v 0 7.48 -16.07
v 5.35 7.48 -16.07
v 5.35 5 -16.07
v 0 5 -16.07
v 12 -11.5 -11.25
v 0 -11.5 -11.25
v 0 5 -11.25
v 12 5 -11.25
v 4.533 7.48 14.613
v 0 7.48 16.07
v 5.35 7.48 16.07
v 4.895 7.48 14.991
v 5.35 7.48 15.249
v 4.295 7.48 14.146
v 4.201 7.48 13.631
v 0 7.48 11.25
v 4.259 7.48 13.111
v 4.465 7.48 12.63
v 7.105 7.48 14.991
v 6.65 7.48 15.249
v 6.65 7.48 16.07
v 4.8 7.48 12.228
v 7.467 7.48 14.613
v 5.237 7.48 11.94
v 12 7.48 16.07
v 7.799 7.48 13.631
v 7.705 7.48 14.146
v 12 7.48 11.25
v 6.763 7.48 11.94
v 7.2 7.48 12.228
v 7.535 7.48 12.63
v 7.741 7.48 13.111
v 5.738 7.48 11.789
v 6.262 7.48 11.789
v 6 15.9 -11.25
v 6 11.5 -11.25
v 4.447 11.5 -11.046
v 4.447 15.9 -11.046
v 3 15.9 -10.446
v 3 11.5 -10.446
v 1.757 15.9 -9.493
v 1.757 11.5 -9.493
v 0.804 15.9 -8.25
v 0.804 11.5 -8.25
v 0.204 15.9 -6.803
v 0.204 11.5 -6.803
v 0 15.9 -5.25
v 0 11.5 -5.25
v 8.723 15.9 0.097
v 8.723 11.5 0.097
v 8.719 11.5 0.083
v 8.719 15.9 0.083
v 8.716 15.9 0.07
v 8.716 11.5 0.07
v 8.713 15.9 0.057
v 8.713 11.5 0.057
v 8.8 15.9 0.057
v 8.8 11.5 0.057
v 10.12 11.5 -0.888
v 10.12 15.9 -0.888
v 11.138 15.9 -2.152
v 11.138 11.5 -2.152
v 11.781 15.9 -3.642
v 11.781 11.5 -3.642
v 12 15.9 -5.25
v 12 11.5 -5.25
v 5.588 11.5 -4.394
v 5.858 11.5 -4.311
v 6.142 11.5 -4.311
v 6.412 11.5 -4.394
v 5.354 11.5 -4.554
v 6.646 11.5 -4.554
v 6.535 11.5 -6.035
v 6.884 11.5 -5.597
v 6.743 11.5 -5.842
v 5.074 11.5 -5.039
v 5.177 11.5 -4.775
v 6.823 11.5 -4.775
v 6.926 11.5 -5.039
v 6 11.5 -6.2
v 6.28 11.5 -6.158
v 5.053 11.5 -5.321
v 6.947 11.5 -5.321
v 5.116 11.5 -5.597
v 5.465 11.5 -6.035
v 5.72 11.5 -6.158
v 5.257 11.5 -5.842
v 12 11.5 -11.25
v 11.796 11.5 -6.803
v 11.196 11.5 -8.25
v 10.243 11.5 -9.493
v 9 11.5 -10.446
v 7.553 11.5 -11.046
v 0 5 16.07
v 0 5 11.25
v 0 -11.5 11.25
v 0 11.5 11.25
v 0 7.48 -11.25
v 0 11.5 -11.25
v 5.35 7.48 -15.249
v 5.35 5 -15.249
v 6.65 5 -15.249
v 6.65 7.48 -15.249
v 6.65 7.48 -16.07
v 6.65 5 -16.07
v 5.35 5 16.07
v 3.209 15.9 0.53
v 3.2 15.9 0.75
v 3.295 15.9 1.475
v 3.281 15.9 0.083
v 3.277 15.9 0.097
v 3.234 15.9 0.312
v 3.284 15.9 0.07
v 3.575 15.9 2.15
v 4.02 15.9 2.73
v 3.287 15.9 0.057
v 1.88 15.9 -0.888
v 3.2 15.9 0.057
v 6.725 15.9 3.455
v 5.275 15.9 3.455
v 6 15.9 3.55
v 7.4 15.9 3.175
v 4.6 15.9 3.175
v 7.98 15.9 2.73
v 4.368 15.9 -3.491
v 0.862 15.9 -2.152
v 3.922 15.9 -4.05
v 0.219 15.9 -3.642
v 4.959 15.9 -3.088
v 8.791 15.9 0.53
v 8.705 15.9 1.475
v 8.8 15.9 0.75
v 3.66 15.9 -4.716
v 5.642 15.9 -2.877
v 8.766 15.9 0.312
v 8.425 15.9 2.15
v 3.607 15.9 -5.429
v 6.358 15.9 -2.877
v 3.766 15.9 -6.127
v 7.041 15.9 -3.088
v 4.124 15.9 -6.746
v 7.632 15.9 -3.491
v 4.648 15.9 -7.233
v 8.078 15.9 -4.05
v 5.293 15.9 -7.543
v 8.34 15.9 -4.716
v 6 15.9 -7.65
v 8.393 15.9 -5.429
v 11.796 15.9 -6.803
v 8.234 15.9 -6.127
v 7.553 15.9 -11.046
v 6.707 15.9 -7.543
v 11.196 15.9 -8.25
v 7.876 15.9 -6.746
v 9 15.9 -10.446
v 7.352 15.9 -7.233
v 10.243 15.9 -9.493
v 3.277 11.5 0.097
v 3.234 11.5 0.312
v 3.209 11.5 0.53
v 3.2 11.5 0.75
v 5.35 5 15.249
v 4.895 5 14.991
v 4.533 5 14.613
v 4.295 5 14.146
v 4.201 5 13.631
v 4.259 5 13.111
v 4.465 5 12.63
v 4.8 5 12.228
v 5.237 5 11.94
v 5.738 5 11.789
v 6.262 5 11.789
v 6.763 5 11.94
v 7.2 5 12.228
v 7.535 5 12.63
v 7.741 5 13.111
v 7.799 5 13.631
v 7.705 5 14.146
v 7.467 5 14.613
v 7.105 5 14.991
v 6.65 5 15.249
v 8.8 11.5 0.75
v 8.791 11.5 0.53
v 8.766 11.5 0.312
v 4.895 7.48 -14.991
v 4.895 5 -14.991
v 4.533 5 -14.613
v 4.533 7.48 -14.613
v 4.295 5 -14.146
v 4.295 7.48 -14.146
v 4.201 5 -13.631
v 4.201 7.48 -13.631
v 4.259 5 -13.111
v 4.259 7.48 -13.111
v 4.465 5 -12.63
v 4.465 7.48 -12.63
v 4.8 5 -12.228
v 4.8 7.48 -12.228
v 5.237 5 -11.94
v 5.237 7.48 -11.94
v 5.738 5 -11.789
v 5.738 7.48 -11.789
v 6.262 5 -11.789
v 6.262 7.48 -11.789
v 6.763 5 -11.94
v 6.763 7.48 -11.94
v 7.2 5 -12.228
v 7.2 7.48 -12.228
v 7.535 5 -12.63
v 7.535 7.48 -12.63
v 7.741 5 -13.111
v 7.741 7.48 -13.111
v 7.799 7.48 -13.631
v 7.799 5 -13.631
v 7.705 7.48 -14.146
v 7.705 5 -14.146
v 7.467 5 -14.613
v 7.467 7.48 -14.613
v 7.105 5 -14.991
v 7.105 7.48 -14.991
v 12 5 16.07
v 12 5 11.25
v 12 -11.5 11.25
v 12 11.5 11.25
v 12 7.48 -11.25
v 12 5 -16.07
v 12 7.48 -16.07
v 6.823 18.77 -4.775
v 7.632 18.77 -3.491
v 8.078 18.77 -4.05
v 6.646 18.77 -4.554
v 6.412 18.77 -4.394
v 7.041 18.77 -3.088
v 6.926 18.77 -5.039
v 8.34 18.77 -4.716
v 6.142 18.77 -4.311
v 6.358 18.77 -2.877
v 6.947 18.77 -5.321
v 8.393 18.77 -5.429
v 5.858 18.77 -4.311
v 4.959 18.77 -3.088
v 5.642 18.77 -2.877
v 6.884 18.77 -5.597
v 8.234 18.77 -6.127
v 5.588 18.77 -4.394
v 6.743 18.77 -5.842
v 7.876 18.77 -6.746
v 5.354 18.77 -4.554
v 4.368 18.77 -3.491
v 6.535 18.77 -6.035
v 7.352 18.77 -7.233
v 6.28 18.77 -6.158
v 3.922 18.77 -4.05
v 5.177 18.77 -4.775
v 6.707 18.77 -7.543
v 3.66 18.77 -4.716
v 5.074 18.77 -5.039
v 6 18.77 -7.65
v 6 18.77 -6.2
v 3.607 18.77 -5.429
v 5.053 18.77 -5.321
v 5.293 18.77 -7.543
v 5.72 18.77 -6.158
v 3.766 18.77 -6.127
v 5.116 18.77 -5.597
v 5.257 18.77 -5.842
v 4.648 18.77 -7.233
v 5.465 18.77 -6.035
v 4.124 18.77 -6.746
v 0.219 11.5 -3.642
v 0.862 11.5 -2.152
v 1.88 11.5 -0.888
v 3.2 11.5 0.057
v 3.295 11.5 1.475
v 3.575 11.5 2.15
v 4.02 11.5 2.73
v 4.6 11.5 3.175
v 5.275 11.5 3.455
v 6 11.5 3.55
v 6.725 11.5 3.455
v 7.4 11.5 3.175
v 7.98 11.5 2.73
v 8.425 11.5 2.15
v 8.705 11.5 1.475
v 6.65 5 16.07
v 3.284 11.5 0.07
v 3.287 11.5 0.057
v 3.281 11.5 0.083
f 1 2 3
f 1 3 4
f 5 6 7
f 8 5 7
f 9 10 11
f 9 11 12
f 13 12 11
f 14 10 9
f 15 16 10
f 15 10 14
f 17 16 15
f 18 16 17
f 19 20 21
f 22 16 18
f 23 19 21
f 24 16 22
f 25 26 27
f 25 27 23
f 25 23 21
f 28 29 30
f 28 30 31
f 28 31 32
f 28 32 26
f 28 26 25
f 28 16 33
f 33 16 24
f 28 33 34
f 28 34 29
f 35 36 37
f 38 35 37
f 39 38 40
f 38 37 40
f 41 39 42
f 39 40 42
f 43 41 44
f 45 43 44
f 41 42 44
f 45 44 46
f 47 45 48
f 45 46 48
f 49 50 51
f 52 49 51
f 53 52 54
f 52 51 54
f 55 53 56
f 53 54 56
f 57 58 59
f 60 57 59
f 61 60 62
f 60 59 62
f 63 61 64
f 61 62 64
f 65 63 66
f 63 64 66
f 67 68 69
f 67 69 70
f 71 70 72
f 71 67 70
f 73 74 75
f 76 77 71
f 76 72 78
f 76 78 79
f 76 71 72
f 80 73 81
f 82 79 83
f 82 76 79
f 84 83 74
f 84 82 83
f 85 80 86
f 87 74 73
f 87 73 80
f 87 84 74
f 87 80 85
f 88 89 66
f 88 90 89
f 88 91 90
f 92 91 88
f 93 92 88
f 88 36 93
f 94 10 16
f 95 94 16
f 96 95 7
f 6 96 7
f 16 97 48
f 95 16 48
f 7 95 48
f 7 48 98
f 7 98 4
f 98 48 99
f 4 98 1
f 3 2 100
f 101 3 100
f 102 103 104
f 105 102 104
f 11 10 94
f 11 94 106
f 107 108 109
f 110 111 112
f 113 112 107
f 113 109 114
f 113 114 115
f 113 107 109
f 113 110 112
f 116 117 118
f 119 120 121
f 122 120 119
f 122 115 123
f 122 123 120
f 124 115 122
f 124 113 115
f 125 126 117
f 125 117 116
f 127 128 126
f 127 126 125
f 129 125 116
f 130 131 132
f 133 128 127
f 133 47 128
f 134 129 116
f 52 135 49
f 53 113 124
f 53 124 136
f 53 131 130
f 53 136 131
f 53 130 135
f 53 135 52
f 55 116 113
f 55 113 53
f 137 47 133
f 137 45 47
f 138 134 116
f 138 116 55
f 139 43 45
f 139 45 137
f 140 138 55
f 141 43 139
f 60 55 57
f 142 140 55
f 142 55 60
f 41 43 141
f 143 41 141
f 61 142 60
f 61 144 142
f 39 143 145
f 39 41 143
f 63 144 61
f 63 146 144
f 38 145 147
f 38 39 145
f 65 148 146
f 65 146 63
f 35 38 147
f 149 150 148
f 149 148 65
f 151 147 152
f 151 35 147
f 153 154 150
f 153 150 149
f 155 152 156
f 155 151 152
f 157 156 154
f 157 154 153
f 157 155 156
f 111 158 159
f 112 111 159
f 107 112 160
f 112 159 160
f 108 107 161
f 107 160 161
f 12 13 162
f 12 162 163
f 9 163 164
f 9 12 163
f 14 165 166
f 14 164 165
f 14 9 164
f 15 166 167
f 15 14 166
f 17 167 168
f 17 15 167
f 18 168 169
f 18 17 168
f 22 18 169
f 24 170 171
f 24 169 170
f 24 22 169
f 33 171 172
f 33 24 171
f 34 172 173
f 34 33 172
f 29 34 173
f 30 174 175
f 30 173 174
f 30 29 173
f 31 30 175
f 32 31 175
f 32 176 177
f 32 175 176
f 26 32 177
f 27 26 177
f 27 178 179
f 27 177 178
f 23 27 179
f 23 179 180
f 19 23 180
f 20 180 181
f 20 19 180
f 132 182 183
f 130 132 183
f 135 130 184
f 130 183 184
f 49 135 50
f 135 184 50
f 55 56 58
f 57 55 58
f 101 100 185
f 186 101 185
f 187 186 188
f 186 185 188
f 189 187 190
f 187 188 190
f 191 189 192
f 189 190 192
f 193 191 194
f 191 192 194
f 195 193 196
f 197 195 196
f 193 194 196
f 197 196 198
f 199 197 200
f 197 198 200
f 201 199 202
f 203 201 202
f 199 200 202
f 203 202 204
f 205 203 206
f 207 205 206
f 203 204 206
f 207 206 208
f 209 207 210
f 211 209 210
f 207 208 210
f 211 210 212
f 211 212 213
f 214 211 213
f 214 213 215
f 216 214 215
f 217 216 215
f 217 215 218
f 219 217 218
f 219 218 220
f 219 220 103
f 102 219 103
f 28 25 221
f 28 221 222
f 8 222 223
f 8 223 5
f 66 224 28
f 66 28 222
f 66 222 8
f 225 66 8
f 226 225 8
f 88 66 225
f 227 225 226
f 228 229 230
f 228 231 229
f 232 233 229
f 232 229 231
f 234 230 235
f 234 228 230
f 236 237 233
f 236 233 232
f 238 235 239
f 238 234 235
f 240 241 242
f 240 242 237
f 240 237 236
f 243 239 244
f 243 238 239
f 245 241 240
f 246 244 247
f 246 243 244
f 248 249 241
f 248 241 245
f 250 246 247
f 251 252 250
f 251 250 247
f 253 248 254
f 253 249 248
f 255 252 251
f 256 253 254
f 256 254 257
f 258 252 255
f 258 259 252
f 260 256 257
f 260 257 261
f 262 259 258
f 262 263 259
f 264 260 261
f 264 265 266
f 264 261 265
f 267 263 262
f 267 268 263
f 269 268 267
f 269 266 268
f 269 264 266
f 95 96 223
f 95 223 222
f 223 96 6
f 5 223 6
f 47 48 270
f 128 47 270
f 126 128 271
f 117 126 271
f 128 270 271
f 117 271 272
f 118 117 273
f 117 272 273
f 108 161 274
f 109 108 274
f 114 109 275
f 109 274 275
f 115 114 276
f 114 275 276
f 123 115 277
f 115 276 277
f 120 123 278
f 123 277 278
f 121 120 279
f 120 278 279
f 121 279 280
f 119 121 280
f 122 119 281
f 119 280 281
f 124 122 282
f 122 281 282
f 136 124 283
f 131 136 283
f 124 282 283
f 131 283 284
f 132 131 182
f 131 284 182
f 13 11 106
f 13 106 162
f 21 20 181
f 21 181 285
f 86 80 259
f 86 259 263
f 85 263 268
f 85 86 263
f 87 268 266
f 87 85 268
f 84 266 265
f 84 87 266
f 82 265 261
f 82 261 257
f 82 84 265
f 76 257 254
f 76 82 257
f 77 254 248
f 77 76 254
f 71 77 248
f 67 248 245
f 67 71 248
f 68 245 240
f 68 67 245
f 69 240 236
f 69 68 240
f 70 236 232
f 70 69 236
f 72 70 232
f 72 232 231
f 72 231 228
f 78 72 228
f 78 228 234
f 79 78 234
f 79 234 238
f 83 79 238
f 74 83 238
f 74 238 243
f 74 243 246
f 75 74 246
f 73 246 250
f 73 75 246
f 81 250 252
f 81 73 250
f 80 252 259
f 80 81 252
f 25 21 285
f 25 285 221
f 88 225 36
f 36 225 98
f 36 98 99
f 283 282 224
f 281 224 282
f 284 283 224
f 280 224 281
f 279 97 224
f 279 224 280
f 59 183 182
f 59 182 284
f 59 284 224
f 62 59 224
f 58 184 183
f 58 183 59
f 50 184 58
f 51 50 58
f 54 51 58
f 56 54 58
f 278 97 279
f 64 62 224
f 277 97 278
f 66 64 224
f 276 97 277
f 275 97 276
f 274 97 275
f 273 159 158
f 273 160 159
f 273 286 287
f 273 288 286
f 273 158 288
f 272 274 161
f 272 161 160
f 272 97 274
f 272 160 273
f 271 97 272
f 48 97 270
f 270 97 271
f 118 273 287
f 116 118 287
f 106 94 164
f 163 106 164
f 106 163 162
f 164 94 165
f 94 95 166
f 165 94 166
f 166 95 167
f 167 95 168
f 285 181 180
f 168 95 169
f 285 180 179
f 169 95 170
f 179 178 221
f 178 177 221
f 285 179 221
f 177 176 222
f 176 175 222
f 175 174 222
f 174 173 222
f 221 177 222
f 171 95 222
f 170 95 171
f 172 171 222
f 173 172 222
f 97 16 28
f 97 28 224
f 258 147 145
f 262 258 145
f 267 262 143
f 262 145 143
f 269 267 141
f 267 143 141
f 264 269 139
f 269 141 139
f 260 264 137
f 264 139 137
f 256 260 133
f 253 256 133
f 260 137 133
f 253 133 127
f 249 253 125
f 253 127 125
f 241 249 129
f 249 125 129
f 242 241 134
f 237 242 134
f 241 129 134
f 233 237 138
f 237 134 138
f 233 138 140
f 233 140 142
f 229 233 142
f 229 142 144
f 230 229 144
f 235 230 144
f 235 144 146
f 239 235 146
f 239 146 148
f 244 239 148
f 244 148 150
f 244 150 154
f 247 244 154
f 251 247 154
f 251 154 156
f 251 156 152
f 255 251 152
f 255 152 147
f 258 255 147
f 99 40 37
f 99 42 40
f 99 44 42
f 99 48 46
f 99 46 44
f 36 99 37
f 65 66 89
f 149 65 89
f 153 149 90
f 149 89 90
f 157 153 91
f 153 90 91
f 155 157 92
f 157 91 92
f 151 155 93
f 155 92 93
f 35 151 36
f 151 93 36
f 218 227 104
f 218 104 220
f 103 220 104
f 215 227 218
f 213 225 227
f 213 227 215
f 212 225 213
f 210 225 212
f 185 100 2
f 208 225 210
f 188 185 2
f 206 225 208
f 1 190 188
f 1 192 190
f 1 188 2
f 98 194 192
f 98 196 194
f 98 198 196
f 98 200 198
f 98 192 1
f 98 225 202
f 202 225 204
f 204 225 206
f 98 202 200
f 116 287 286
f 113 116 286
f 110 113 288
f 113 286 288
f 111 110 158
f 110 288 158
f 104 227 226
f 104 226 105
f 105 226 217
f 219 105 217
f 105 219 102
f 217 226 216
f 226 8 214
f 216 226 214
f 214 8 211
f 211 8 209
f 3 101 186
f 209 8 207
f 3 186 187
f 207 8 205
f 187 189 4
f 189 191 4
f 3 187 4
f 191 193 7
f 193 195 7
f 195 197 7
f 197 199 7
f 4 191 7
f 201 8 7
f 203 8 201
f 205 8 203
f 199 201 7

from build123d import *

# Parameters (mm, degrees)
SKETCH2_W            = 22.5
SKETCH2_H            = 23
BOSS_EXTRUDE1_DEPTH  = 12
SKETCH19_W           = 12
SKETCH19_H           = 2.48
BOSS_EXTRUDE8_DEPTH  = 4.82
SKETCH20_W           = 12
SKETCH20_H           = 2.48
BOSS_EXTRUDE9_DEPTH  = 4.82
SKETCH21_R           = 2.4
BOSS_EXTRUDE10_DEPTH = 4.4
SKETCH21_3_R         = 2.4
SKETCH21_3_R_2       = 0.95
BOSS_EXTRUDE11_DEPTH = 7.27
CUT_EXTRUDE5_DEPTH   = 2.49


with BuildPart() as part:
    # Sketch2 → Boss-Extrude1 (new body)
    with BuildSketch(Plane(origin=(0, 0, 0), x_dir=(0, 0, -1), z_dir=(1, 0, 0))):
        Rectangle(SKETCH2_W, SKETCH2_H)
    extrude(amount=BOSS_EXTRUDE1_DEPTH)

    # Sketch19 → Boss-Extrude8 (add)
    with BuildSketch(Plane.XY.offset(11.25)):
        with Locations((6, 6.24)):
            Rectangle(SKETCH19_W, SKETCH19_H)
    extrude(amount=BOSS_EXTRUDE8_DEPTH)

    # Sketch20 → Boss-Extrude9 (add)
    with BuildSketch(Plane(origin=(0, 0, -11.25), x_dir=(-1, 0, 0), z_dir=(0, 0, -1))):
        with Locations((-6, 6.24)):
            Rectangle(SKETCH20_W, SKETCH20_H)
    extrude(amount=BOSS_EXTRUDE9_DEPTH)

    # Sketch21 → Boss-Extrude10 (add)
    # profile 1 of 6: a face of its own
    with BuildSketch(Plane(origin=(0, 11.5, 0), x_dir=(1, 0, 0), z_dir=(0, 1, 0))):
        with BuildLine():
            ThreePointArc((6, 11.25), (1.757359316, 9.49264069), (0, 5.250000008))
            ThreePointArc((0, 5.250000008), (0.861906966, 2.151613326), (3.2, -0.056599665))
            Line((3.2, -0.056599665), (3.287216195, -0.056599665))
            ThreePointArc((3.287216195, -0.056599665), (6, 2.05), (8.712783805, -0.056599665))
            Line((8.712783805, -0.056599665), (8.8, -0.056599665))
            ThreePointArc((8.8, -0.056599665), (11.138093031, 2.151613323), (12, 5.25))
            ThreePointArc((12, 5.25), (10.242640687, 9.492640687), (6, 11.25))
        make_face()
        with Locations(Location((6, 5.25, 0), (0, 0, 90))):
            Circle(SKETCH21_R, mode=Mode.SUBTRACT)
    # profile 2 of 6: a face of its own
    with BuildSketch(Plane(origin=(0, 11.5, 0), x_dir=(1, 0, 0), z_dir=(0, 1, 0))):
        with BuildLine():
            Line((6, -0.75), (8.8, -0.75))
            ThreePointArc((8.8, -0.75), (8.780610633, -0.421055467), (8.722711067, -0.096666667))
            ThreePointArc((8.722711067, -0.096666667), (7.4, -0.584380858), (6, -0.75))
        make_face()
    # profile 3 of 6: a face of its own
    with BuildSketch(Plane(origin=(0, 11.5, 0), x_dir=(1, 0, 0), z_dir=(0, 1, 0))):
        with BuildLine():
            ThreePointArc((3.277288933, -0.096666667), (3.219389367, -0.421055467), (3.2, -0.75))
            Line((3.2, -0.75), (6, -0.75))
            ThreePointArc((6, -0.75), (4.6, -0.584380858), (3.277288933, -0.096666667))
        make_face()
    # profile 4 of 6: a face of its own
    with BuildSketch(Plane(origin=(0, 11.5, 0), x_dir=(1, 0, 0), z_dir=(0, 1, 0))):
        with BuildLine():
            ThreePointArc((3.2, -0.75), (4.020101013, -2.729898987), (6, -3.55))
            ThreePointArc((6, -3.55), (7.979898987, -2.729898987), (8.8, -0.75))
            Line((8.8, -0.75), (6, -0.75))
            Line((6, -0.75), (3.2, -0.75))
        make_face()
    # profile 5 of 6: a face of its own
    with BuildSketch(Plane(origin=(0, 11.5, 0), x_dir=(1, 0, 0), z_dir=(0, 1, 0))):
        with BuildLine():
            ThreePointArc((8.712783805, -0.056599665), (6, 2.05), (3.287216195, -0.056599665))
            Line((3.287216195, -0.056599665), (8.712783805, -0.056599665))
        make_face()
    # profile 6 of 6: a face of its own
    with BuildSketch(Plane(origin=(0, 11.5, 0), x_dir=(1, 0, 0), z_dir=(0, 1, 0))):
        with BuildLine():
            ThreePointArc((3.277288933, -0.096666667), (4.6, -0.584380858), (6, -0.75))
            ThreePointArc((6, -0.75), (7.4, -0.584380858), (8.722711067, -0.096666667))
            ThreePointArc((8.722711067, -0.096666667), (8.717821272, -0.076614872), (8.712783805, -0.056599665))
            Line((8.712783805, -0.056599665), (3.287216195, -0.056599665))
            ThreePointArc((3.287216195, -0.056599665), (3.282178728, -0.076614872), (3.277288933, -0.096666667))
        make_face()
    extrude(amount=BOSS_EXTRUDE10_DEPTH)

    # Sketch21<3> → Boss-Extrude11 (add)
    with BuildSketch(Plane(origin=(0, 11.5, 0), x_dir=(1, 0, 0), z_dir=(0, 1, 0))):
        with Locations(Location((6, 5.25, 0), (0, 0, 90))):
            Circle(SKETCH21_3_R)
        with Locations(Location((6, 5.25, 0), (0, 0, 90))):
            Circle(SKETCH21_3_R_2, mode=Mode.SUBTRACT)
    extrude(amount=BOSS_EXTRUDE11_DEPTH)

    # Sketch23 → Cut-Extrude5 (cut)
    with BuildSketch(Plane(origin=(0, 7.48, 0), x_dir=(1, 0, 0), z_dir=(0, 1, 0))):
        with BuildLine():
            Line((6.65, -15.248541033), (6.65, -16.07))
            Line((6.65, -16.07), (5.35, -16.07))
            Line((5.35, -16.07), (5.35, -15.248541033))
            ThreePointArc((5.35, -15.248541033), (6, -11.77), (6.65, -15.248541033))
        make_face()
    cut_extrude5 = extrude(amount=-CUT_EXTRUDE5_DEPTH, mode=Mode.SUBTRACT)

    # Mirror3: Cut-Extrude5 across plane
    add(cut_extrude5.mirror(Plane.XY), mode=Mode.SUBTRACT)


solid = part.part
